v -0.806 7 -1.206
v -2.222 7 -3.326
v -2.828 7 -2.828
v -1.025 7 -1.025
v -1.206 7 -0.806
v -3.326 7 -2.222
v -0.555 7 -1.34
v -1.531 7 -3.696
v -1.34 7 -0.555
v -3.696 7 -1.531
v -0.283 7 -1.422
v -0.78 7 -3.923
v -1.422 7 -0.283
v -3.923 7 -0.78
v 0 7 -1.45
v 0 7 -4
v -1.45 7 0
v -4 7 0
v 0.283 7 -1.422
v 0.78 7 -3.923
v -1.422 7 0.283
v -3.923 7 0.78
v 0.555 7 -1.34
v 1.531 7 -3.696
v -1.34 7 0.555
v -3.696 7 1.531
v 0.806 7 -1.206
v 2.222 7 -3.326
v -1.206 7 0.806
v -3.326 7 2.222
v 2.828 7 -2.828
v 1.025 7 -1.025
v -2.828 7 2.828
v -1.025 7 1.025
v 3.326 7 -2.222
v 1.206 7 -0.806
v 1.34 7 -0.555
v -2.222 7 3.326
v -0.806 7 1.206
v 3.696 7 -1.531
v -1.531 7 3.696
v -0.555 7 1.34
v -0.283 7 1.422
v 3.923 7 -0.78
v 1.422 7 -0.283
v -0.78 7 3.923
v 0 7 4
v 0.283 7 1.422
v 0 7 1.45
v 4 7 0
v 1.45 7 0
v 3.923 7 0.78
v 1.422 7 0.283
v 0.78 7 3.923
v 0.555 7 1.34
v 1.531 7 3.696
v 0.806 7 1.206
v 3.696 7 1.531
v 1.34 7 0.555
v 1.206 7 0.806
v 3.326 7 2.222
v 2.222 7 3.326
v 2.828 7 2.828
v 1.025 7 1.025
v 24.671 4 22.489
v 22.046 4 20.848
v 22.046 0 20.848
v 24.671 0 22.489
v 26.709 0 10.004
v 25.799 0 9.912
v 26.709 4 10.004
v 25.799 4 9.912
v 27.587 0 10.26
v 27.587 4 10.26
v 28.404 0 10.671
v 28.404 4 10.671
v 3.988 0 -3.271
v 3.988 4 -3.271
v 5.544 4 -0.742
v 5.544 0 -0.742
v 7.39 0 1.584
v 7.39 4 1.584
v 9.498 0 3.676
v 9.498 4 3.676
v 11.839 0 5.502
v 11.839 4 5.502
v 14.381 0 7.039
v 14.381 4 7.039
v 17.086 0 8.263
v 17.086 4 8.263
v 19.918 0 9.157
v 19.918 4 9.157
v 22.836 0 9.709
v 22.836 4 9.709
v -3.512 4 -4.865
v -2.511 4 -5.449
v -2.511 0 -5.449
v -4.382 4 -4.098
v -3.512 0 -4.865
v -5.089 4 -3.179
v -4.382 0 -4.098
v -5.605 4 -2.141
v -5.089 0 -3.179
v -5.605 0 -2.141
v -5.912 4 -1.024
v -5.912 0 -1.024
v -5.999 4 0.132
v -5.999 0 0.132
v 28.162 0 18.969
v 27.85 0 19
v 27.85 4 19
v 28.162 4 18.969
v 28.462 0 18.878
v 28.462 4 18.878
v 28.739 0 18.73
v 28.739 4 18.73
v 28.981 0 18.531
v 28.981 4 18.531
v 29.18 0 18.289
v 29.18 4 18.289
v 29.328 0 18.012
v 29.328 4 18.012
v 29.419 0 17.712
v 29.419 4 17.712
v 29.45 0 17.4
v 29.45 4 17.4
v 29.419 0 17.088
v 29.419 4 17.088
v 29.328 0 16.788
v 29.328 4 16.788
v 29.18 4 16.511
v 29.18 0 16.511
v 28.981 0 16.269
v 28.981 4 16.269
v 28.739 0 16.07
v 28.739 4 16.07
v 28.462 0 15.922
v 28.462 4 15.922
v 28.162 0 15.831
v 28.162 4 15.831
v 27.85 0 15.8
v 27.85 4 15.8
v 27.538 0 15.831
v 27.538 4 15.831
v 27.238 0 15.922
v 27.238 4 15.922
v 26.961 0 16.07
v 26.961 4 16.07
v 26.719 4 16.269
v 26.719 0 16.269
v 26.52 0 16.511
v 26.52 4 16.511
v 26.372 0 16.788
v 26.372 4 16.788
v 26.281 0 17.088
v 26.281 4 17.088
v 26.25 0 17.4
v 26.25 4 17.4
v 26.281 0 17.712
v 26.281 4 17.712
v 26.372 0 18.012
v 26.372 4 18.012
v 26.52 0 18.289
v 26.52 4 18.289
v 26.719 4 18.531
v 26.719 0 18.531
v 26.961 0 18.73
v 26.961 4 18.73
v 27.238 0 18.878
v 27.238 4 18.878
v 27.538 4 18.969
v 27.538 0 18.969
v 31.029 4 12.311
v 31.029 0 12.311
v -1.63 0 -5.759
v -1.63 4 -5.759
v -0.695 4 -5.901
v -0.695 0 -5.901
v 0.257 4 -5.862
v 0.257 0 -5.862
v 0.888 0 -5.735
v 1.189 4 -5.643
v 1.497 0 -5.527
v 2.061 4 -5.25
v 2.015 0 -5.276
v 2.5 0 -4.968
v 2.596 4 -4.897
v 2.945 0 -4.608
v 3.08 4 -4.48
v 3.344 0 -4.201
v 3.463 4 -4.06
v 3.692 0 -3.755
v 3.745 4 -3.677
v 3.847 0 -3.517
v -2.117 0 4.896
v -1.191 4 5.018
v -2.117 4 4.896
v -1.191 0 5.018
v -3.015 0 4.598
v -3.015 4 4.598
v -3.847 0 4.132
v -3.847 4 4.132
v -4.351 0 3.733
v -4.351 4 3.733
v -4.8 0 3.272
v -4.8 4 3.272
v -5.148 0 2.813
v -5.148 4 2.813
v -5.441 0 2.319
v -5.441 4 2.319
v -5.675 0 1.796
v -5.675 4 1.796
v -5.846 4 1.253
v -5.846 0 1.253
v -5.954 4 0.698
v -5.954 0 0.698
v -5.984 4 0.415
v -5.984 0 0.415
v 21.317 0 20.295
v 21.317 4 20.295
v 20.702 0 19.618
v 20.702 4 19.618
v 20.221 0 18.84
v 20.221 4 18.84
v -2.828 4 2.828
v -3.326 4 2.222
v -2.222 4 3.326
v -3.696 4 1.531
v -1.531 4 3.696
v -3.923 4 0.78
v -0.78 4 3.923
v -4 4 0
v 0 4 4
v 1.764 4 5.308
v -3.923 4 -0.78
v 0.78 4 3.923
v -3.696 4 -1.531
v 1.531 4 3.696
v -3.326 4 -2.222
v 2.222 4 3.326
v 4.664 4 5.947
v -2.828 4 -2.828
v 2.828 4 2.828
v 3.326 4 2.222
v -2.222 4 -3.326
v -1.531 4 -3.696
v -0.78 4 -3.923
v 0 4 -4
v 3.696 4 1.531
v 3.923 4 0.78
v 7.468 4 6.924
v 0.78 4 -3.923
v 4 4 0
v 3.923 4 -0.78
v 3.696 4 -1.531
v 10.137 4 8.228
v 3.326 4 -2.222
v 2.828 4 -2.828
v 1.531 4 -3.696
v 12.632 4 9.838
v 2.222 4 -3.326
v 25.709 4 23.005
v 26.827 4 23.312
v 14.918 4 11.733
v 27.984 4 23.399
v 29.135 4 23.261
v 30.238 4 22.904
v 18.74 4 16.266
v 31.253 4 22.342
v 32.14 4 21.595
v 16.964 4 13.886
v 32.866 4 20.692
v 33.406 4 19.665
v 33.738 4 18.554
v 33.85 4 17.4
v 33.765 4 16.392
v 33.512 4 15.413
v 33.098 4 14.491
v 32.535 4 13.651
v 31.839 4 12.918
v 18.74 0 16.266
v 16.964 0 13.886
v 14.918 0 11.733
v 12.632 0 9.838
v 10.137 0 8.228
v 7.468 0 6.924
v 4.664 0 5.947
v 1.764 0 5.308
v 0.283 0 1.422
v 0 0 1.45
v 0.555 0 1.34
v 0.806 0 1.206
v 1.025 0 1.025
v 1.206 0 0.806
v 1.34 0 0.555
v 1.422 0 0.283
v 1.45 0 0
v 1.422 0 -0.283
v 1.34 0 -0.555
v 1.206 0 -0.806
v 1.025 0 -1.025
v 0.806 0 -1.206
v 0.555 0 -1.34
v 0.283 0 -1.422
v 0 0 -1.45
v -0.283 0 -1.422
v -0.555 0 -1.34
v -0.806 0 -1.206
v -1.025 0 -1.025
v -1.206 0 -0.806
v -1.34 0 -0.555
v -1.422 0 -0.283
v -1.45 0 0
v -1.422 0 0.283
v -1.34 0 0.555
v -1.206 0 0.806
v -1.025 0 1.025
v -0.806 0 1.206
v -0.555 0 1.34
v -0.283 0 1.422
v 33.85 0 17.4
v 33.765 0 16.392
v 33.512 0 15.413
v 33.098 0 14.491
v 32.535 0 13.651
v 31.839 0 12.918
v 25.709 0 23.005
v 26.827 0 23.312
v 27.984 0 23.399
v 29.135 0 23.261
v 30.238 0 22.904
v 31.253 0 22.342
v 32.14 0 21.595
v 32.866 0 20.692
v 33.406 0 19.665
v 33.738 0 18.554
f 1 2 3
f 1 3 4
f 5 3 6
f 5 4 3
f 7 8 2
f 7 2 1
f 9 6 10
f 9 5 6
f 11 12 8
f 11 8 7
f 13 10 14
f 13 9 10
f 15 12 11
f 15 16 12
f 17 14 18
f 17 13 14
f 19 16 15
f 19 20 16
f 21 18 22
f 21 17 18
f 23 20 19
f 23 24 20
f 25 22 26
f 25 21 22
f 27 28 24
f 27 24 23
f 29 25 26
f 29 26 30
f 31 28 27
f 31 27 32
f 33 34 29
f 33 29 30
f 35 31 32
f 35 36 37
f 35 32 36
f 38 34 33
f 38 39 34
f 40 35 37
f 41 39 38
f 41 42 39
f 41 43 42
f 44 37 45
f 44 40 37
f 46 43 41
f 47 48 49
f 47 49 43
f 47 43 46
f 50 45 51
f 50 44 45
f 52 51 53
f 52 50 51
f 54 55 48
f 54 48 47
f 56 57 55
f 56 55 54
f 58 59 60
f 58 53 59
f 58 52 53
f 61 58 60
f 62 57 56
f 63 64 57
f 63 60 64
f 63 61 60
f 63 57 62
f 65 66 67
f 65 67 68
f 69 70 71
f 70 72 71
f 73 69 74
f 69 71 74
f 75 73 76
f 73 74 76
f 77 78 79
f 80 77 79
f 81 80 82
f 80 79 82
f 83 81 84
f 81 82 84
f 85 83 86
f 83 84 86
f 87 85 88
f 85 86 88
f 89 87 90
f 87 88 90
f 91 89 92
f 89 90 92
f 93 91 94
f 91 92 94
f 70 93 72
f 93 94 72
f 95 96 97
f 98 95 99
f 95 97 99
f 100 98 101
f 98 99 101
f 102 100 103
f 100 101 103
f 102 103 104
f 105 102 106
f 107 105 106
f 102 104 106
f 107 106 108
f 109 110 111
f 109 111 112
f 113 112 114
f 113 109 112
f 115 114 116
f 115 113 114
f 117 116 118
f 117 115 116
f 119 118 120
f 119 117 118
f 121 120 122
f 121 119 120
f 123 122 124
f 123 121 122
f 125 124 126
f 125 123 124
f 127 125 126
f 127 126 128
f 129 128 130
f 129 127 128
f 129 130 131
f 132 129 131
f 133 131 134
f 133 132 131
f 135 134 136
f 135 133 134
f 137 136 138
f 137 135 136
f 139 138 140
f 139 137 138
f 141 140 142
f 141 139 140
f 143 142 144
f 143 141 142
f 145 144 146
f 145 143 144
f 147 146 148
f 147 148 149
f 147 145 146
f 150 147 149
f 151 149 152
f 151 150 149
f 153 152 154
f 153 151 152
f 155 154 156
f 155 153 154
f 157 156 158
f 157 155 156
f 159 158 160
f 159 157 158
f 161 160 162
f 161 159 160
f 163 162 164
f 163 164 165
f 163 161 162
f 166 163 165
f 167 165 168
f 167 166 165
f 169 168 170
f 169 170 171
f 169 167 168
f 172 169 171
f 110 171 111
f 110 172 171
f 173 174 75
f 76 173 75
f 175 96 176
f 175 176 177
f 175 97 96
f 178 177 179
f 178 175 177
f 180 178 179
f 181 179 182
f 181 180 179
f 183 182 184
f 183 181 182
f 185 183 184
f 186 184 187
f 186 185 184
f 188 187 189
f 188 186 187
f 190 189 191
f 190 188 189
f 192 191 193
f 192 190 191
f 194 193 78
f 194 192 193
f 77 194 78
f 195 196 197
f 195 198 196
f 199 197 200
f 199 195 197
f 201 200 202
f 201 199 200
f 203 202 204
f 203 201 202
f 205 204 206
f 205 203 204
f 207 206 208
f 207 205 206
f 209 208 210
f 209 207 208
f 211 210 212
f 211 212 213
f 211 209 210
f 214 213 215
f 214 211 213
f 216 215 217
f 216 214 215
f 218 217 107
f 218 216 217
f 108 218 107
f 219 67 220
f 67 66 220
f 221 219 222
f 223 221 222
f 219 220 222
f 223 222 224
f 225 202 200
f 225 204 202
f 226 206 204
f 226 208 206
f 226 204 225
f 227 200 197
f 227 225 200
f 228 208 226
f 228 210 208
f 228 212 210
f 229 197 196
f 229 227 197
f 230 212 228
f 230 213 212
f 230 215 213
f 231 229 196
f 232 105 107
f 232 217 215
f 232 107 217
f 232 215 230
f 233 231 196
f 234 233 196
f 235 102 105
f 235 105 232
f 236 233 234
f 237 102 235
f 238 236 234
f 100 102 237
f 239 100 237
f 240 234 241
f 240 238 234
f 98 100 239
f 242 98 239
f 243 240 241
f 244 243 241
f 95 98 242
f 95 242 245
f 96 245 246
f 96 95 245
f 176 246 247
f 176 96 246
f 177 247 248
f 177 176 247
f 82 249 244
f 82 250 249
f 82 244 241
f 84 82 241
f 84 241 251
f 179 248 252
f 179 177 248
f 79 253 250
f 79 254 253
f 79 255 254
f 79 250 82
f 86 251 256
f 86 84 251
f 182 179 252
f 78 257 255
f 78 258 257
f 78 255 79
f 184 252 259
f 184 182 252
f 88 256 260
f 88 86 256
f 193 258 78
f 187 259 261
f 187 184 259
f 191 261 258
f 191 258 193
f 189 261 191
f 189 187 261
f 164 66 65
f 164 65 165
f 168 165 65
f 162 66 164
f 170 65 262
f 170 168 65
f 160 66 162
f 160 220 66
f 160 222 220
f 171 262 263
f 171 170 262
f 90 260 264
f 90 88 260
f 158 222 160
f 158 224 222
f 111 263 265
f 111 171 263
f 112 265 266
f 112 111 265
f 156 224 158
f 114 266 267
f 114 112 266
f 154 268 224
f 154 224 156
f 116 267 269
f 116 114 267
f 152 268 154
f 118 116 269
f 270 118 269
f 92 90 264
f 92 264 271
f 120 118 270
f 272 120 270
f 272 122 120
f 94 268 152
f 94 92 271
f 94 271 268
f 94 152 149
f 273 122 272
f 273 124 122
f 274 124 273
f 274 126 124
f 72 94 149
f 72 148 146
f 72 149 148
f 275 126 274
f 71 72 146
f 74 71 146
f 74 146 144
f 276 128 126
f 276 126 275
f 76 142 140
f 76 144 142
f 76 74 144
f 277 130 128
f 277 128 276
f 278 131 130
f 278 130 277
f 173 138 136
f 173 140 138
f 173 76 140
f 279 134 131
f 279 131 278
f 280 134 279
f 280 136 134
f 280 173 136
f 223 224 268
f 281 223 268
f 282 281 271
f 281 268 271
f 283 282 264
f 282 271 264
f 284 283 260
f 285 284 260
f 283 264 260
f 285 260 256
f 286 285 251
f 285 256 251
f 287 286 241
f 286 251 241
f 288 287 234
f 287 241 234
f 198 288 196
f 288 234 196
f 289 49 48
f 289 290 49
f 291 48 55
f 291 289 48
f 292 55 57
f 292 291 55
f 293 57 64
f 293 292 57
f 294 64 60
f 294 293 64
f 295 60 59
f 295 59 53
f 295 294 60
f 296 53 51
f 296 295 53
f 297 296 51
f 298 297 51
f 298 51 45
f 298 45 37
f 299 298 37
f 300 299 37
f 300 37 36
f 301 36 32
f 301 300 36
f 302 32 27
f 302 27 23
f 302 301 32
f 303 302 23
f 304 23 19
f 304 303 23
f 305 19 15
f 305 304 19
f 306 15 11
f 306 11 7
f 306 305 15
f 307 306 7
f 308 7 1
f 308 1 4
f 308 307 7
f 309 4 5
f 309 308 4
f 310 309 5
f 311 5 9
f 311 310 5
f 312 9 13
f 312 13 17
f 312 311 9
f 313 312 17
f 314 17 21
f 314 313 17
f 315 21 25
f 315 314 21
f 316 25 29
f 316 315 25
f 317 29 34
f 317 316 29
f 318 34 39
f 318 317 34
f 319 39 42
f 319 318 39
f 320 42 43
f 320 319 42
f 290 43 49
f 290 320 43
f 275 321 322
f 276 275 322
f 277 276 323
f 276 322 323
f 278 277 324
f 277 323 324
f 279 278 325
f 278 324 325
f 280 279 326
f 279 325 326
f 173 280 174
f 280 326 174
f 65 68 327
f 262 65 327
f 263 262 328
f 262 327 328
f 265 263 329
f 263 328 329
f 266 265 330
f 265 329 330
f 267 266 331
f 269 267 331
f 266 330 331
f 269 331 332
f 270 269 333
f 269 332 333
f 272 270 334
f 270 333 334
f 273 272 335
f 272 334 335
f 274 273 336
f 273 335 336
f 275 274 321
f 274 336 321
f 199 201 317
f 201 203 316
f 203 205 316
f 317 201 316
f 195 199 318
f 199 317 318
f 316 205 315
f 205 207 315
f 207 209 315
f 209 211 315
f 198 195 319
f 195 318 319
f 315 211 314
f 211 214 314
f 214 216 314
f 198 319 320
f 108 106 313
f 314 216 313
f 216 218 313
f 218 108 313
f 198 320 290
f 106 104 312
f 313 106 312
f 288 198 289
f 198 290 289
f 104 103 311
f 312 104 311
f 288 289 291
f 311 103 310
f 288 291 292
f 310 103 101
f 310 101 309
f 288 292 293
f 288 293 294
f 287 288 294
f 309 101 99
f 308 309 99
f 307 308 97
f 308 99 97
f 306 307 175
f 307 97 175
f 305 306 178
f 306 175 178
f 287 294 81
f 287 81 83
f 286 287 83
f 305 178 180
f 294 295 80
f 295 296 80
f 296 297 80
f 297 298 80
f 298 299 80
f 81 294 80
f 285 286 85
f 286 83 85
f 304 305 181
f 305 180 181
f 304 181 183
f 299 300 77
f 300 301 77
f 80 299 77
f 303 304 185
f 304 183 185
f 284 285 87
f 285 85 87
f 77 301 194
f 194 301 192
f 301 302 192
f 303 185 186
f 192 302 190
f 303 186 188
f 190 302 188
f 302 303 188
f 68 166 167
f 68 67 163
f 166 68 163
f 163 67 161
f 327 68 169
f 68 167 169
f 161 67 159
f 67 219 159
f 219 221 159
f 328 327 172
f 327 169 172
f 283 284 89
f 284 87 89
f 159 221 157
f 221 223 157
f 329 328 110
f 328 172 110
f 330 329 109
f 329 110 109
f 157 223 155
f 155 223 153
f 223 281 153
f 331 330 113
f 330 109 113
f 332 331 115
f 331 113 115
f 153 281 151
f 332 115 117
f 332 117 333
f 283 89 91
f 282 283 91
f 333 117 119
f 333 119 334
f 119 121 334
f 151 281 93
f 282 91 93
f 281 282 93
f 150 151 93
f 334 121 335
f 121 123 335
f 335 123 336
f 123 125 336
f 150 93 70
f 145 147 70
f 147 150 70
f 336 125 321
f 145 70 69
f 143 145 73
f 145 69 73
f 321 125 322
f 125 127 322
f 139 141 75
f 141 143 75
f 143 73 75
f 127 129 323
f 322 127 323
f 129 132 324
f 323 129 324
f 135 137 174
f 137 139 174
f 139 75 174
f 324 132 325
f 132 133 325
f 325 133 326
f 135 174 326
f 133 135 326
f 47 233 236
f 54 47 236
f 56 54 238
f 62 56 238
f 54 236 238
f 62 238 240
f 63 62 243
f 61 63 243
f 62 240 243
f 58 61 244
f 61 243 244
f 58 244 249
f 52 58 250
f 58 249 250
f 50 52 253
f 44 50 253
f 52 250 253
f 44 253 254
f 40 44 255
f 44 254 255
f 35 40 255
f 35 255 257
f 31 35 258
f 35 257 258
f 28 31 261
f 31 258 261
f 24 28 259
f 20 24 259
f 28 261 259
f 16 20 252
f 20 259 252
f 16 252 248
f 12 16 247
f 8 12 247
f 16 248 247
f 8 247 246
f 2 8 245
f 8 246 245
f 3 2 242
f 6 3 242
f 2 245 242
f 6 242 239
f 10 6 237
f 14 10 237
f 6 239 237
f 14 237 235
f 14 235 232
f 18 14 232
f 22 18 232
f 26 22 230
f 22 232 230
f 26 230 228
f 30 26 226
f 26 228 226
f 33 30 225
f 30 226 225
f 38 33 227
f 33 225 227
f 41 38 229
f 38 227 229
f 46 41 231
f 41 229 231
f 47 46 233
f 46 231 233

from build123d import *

# Parameters (mm, degrees)
SKETCH1_R           = 1.45
SKETCH1_R_2         = 1.6
BOSS_EXTRUDE1_DEPTH = 4
SKETCH2_R           = 4
SKETCH2_R_2         = 1.45
BOSS_EXTRUDE2_DEPTH = 3
SKETCH3_R           = 25
CUT_EXTRUDE1_DEPTH  = 10
FILLET1_R           = 5


with BuildPart() as part:
    # Sketch1 → Boss-Extrude1 (new body)
    # profile 1 of 3: a face of its own
    with BuildSketch(Plane(origin=(0, 0, 0), x_dir=(1, 0, 0), z_dir=(0, 1, 0))):
        with BuildLine():
            ThreePointArc((6, 0), (5.247620154, 2.909034672), (3.179172425, 5.088502991))
            ThreePointArc((3.179172425, 5.088502991), (-3.872509642, 4.582976007), (-5.547666284, -2.285475619))
            ThreePointArc((-5.547666284, -2.285475619), (-4.582976007, -3.872509642), (-3.179172425, -5.088502991))
            ThreePointArc((-3.179172425, -5.088502991), (2.909034672, -5.247620154), (6, 0))
        make_face()
        with Locations(Location((0, 0, 0), (0, 0, 270))):
            Circle(SKETCH1_R, mode=Mode.SUBTRACT)
    # profile 2 of 3: a face of its own
    with BuildSketch(Plane(origin=(0, 0, 0), x_dir=(1, 0, 0), z_dir=(0, 1, 0))):
        with BuildLine():
            Line((31.029172425, -12.311497009), (3.179172425, 5.088502991))
            ThreePointArc((3.179172425, 5.088502991), (5.247620154, 2.909034672), (6, 0))
            ThreePointArc((6, 0), (2.909034672, -5.247620154), (-3.179172425, -5.088502991))
            Line((-3.179172425, -5.088502991), (24.670827575, -22.488502991))
            ThreePointArc((24.670827575, -22.488502991), (22.602379846, -20.309034672), (21.85, -17.4))
            ThreePointArc((21.85, -17.4), (23.259082466, -13.536908466), (26.824492066, -11.488288448))
            ThreePointArc((26.824492066, -11.488288448), (29.002816451, -11.511790235), (31.029172425, -12.311497009))
        make_face()
    # profile 3 of 3: a face of its own
    with BuildSketch(Plane(origin=(0, 0, 0), x_dir=(1, 0, 0), z_dir=(0, 1, 0))):
        with BuildLine():
            ThreePointArc((33.85, -17.4), (33.097620154, -14.490965328), (31.029172425, -12.311497009))
            ThreePointArc((31.029172425, -12.311497009), (29.002816451, -11.511790235), (26.824492066, -11.488288448))
            ThreePointArc((26.824492066, -11.488288448), (23.259082466, -13.536908466), (21.85, -17.4))
            ThreePointArc((21.85, -17.4), (22.602379846, -20.309034672), (24.670827575, -22.488502991))
            ThreePointArc((24.670827575, -22.488502991), (30.759034672, -22.647620154), (33.85, -17.4))
        make_face()
        with Locations(Location((27.85, -17.4, 0), (0, 0, 270))):
            Circle(SKETCH1_R_2, mode=Mode.SUBTRACT)
    extrude(amount=BOSS_EXTRUDE1_DEPTH)

    # Sketch2 → Boss-Extrude2 (add)
    with BuildSketch(Plane(origin=(0, 4, 0), x_dir=(1, 0, 0), z_dir=(0, 1, 0))):
        with Locations(Location((0, 0, 0), (0, 0, 270))):
            Circle(SKETCH2_R)
        with Locations(Location((0, 0, 0), (0, 0, 270))):
            Circle(SKETCH2_R_2, mode=Mode.SUBTRACT)
    extrude(amount=BOSS_EXTRUDE2_DEPTH)

    # Sketch3 → Cut-Extrude1 (cut)
    with BuildSketch(Plane(origin=(0, 4, 0), x_dir=(1, 0, 0), z_dir=(0, 1, 0))):
        with Locations((-2.15, -30)):
            Circle(SKETCH3_R)
        with Locations((26.019288726, 15.087051209)):
            Circle(SKETCH3_R)
    extrude(amount=-CUT_EXTRUDE1_DEPTH, mode=Mode.SUBTRACT)

    # Fillet1
    fillet1_edges = [part.edges().sort_by_distance(p)[0] for p in [
        (-3.277923152, 2, 5.025457174),
        (20.790880187, 2, 20.064406598),
        (27.149225038, 2, 9.887400616),
        (3.079209508, 2, -5.149608607),
    ]]
    fillet(fillet1_edges, radius=FILLET1_R)


solid = part.part
